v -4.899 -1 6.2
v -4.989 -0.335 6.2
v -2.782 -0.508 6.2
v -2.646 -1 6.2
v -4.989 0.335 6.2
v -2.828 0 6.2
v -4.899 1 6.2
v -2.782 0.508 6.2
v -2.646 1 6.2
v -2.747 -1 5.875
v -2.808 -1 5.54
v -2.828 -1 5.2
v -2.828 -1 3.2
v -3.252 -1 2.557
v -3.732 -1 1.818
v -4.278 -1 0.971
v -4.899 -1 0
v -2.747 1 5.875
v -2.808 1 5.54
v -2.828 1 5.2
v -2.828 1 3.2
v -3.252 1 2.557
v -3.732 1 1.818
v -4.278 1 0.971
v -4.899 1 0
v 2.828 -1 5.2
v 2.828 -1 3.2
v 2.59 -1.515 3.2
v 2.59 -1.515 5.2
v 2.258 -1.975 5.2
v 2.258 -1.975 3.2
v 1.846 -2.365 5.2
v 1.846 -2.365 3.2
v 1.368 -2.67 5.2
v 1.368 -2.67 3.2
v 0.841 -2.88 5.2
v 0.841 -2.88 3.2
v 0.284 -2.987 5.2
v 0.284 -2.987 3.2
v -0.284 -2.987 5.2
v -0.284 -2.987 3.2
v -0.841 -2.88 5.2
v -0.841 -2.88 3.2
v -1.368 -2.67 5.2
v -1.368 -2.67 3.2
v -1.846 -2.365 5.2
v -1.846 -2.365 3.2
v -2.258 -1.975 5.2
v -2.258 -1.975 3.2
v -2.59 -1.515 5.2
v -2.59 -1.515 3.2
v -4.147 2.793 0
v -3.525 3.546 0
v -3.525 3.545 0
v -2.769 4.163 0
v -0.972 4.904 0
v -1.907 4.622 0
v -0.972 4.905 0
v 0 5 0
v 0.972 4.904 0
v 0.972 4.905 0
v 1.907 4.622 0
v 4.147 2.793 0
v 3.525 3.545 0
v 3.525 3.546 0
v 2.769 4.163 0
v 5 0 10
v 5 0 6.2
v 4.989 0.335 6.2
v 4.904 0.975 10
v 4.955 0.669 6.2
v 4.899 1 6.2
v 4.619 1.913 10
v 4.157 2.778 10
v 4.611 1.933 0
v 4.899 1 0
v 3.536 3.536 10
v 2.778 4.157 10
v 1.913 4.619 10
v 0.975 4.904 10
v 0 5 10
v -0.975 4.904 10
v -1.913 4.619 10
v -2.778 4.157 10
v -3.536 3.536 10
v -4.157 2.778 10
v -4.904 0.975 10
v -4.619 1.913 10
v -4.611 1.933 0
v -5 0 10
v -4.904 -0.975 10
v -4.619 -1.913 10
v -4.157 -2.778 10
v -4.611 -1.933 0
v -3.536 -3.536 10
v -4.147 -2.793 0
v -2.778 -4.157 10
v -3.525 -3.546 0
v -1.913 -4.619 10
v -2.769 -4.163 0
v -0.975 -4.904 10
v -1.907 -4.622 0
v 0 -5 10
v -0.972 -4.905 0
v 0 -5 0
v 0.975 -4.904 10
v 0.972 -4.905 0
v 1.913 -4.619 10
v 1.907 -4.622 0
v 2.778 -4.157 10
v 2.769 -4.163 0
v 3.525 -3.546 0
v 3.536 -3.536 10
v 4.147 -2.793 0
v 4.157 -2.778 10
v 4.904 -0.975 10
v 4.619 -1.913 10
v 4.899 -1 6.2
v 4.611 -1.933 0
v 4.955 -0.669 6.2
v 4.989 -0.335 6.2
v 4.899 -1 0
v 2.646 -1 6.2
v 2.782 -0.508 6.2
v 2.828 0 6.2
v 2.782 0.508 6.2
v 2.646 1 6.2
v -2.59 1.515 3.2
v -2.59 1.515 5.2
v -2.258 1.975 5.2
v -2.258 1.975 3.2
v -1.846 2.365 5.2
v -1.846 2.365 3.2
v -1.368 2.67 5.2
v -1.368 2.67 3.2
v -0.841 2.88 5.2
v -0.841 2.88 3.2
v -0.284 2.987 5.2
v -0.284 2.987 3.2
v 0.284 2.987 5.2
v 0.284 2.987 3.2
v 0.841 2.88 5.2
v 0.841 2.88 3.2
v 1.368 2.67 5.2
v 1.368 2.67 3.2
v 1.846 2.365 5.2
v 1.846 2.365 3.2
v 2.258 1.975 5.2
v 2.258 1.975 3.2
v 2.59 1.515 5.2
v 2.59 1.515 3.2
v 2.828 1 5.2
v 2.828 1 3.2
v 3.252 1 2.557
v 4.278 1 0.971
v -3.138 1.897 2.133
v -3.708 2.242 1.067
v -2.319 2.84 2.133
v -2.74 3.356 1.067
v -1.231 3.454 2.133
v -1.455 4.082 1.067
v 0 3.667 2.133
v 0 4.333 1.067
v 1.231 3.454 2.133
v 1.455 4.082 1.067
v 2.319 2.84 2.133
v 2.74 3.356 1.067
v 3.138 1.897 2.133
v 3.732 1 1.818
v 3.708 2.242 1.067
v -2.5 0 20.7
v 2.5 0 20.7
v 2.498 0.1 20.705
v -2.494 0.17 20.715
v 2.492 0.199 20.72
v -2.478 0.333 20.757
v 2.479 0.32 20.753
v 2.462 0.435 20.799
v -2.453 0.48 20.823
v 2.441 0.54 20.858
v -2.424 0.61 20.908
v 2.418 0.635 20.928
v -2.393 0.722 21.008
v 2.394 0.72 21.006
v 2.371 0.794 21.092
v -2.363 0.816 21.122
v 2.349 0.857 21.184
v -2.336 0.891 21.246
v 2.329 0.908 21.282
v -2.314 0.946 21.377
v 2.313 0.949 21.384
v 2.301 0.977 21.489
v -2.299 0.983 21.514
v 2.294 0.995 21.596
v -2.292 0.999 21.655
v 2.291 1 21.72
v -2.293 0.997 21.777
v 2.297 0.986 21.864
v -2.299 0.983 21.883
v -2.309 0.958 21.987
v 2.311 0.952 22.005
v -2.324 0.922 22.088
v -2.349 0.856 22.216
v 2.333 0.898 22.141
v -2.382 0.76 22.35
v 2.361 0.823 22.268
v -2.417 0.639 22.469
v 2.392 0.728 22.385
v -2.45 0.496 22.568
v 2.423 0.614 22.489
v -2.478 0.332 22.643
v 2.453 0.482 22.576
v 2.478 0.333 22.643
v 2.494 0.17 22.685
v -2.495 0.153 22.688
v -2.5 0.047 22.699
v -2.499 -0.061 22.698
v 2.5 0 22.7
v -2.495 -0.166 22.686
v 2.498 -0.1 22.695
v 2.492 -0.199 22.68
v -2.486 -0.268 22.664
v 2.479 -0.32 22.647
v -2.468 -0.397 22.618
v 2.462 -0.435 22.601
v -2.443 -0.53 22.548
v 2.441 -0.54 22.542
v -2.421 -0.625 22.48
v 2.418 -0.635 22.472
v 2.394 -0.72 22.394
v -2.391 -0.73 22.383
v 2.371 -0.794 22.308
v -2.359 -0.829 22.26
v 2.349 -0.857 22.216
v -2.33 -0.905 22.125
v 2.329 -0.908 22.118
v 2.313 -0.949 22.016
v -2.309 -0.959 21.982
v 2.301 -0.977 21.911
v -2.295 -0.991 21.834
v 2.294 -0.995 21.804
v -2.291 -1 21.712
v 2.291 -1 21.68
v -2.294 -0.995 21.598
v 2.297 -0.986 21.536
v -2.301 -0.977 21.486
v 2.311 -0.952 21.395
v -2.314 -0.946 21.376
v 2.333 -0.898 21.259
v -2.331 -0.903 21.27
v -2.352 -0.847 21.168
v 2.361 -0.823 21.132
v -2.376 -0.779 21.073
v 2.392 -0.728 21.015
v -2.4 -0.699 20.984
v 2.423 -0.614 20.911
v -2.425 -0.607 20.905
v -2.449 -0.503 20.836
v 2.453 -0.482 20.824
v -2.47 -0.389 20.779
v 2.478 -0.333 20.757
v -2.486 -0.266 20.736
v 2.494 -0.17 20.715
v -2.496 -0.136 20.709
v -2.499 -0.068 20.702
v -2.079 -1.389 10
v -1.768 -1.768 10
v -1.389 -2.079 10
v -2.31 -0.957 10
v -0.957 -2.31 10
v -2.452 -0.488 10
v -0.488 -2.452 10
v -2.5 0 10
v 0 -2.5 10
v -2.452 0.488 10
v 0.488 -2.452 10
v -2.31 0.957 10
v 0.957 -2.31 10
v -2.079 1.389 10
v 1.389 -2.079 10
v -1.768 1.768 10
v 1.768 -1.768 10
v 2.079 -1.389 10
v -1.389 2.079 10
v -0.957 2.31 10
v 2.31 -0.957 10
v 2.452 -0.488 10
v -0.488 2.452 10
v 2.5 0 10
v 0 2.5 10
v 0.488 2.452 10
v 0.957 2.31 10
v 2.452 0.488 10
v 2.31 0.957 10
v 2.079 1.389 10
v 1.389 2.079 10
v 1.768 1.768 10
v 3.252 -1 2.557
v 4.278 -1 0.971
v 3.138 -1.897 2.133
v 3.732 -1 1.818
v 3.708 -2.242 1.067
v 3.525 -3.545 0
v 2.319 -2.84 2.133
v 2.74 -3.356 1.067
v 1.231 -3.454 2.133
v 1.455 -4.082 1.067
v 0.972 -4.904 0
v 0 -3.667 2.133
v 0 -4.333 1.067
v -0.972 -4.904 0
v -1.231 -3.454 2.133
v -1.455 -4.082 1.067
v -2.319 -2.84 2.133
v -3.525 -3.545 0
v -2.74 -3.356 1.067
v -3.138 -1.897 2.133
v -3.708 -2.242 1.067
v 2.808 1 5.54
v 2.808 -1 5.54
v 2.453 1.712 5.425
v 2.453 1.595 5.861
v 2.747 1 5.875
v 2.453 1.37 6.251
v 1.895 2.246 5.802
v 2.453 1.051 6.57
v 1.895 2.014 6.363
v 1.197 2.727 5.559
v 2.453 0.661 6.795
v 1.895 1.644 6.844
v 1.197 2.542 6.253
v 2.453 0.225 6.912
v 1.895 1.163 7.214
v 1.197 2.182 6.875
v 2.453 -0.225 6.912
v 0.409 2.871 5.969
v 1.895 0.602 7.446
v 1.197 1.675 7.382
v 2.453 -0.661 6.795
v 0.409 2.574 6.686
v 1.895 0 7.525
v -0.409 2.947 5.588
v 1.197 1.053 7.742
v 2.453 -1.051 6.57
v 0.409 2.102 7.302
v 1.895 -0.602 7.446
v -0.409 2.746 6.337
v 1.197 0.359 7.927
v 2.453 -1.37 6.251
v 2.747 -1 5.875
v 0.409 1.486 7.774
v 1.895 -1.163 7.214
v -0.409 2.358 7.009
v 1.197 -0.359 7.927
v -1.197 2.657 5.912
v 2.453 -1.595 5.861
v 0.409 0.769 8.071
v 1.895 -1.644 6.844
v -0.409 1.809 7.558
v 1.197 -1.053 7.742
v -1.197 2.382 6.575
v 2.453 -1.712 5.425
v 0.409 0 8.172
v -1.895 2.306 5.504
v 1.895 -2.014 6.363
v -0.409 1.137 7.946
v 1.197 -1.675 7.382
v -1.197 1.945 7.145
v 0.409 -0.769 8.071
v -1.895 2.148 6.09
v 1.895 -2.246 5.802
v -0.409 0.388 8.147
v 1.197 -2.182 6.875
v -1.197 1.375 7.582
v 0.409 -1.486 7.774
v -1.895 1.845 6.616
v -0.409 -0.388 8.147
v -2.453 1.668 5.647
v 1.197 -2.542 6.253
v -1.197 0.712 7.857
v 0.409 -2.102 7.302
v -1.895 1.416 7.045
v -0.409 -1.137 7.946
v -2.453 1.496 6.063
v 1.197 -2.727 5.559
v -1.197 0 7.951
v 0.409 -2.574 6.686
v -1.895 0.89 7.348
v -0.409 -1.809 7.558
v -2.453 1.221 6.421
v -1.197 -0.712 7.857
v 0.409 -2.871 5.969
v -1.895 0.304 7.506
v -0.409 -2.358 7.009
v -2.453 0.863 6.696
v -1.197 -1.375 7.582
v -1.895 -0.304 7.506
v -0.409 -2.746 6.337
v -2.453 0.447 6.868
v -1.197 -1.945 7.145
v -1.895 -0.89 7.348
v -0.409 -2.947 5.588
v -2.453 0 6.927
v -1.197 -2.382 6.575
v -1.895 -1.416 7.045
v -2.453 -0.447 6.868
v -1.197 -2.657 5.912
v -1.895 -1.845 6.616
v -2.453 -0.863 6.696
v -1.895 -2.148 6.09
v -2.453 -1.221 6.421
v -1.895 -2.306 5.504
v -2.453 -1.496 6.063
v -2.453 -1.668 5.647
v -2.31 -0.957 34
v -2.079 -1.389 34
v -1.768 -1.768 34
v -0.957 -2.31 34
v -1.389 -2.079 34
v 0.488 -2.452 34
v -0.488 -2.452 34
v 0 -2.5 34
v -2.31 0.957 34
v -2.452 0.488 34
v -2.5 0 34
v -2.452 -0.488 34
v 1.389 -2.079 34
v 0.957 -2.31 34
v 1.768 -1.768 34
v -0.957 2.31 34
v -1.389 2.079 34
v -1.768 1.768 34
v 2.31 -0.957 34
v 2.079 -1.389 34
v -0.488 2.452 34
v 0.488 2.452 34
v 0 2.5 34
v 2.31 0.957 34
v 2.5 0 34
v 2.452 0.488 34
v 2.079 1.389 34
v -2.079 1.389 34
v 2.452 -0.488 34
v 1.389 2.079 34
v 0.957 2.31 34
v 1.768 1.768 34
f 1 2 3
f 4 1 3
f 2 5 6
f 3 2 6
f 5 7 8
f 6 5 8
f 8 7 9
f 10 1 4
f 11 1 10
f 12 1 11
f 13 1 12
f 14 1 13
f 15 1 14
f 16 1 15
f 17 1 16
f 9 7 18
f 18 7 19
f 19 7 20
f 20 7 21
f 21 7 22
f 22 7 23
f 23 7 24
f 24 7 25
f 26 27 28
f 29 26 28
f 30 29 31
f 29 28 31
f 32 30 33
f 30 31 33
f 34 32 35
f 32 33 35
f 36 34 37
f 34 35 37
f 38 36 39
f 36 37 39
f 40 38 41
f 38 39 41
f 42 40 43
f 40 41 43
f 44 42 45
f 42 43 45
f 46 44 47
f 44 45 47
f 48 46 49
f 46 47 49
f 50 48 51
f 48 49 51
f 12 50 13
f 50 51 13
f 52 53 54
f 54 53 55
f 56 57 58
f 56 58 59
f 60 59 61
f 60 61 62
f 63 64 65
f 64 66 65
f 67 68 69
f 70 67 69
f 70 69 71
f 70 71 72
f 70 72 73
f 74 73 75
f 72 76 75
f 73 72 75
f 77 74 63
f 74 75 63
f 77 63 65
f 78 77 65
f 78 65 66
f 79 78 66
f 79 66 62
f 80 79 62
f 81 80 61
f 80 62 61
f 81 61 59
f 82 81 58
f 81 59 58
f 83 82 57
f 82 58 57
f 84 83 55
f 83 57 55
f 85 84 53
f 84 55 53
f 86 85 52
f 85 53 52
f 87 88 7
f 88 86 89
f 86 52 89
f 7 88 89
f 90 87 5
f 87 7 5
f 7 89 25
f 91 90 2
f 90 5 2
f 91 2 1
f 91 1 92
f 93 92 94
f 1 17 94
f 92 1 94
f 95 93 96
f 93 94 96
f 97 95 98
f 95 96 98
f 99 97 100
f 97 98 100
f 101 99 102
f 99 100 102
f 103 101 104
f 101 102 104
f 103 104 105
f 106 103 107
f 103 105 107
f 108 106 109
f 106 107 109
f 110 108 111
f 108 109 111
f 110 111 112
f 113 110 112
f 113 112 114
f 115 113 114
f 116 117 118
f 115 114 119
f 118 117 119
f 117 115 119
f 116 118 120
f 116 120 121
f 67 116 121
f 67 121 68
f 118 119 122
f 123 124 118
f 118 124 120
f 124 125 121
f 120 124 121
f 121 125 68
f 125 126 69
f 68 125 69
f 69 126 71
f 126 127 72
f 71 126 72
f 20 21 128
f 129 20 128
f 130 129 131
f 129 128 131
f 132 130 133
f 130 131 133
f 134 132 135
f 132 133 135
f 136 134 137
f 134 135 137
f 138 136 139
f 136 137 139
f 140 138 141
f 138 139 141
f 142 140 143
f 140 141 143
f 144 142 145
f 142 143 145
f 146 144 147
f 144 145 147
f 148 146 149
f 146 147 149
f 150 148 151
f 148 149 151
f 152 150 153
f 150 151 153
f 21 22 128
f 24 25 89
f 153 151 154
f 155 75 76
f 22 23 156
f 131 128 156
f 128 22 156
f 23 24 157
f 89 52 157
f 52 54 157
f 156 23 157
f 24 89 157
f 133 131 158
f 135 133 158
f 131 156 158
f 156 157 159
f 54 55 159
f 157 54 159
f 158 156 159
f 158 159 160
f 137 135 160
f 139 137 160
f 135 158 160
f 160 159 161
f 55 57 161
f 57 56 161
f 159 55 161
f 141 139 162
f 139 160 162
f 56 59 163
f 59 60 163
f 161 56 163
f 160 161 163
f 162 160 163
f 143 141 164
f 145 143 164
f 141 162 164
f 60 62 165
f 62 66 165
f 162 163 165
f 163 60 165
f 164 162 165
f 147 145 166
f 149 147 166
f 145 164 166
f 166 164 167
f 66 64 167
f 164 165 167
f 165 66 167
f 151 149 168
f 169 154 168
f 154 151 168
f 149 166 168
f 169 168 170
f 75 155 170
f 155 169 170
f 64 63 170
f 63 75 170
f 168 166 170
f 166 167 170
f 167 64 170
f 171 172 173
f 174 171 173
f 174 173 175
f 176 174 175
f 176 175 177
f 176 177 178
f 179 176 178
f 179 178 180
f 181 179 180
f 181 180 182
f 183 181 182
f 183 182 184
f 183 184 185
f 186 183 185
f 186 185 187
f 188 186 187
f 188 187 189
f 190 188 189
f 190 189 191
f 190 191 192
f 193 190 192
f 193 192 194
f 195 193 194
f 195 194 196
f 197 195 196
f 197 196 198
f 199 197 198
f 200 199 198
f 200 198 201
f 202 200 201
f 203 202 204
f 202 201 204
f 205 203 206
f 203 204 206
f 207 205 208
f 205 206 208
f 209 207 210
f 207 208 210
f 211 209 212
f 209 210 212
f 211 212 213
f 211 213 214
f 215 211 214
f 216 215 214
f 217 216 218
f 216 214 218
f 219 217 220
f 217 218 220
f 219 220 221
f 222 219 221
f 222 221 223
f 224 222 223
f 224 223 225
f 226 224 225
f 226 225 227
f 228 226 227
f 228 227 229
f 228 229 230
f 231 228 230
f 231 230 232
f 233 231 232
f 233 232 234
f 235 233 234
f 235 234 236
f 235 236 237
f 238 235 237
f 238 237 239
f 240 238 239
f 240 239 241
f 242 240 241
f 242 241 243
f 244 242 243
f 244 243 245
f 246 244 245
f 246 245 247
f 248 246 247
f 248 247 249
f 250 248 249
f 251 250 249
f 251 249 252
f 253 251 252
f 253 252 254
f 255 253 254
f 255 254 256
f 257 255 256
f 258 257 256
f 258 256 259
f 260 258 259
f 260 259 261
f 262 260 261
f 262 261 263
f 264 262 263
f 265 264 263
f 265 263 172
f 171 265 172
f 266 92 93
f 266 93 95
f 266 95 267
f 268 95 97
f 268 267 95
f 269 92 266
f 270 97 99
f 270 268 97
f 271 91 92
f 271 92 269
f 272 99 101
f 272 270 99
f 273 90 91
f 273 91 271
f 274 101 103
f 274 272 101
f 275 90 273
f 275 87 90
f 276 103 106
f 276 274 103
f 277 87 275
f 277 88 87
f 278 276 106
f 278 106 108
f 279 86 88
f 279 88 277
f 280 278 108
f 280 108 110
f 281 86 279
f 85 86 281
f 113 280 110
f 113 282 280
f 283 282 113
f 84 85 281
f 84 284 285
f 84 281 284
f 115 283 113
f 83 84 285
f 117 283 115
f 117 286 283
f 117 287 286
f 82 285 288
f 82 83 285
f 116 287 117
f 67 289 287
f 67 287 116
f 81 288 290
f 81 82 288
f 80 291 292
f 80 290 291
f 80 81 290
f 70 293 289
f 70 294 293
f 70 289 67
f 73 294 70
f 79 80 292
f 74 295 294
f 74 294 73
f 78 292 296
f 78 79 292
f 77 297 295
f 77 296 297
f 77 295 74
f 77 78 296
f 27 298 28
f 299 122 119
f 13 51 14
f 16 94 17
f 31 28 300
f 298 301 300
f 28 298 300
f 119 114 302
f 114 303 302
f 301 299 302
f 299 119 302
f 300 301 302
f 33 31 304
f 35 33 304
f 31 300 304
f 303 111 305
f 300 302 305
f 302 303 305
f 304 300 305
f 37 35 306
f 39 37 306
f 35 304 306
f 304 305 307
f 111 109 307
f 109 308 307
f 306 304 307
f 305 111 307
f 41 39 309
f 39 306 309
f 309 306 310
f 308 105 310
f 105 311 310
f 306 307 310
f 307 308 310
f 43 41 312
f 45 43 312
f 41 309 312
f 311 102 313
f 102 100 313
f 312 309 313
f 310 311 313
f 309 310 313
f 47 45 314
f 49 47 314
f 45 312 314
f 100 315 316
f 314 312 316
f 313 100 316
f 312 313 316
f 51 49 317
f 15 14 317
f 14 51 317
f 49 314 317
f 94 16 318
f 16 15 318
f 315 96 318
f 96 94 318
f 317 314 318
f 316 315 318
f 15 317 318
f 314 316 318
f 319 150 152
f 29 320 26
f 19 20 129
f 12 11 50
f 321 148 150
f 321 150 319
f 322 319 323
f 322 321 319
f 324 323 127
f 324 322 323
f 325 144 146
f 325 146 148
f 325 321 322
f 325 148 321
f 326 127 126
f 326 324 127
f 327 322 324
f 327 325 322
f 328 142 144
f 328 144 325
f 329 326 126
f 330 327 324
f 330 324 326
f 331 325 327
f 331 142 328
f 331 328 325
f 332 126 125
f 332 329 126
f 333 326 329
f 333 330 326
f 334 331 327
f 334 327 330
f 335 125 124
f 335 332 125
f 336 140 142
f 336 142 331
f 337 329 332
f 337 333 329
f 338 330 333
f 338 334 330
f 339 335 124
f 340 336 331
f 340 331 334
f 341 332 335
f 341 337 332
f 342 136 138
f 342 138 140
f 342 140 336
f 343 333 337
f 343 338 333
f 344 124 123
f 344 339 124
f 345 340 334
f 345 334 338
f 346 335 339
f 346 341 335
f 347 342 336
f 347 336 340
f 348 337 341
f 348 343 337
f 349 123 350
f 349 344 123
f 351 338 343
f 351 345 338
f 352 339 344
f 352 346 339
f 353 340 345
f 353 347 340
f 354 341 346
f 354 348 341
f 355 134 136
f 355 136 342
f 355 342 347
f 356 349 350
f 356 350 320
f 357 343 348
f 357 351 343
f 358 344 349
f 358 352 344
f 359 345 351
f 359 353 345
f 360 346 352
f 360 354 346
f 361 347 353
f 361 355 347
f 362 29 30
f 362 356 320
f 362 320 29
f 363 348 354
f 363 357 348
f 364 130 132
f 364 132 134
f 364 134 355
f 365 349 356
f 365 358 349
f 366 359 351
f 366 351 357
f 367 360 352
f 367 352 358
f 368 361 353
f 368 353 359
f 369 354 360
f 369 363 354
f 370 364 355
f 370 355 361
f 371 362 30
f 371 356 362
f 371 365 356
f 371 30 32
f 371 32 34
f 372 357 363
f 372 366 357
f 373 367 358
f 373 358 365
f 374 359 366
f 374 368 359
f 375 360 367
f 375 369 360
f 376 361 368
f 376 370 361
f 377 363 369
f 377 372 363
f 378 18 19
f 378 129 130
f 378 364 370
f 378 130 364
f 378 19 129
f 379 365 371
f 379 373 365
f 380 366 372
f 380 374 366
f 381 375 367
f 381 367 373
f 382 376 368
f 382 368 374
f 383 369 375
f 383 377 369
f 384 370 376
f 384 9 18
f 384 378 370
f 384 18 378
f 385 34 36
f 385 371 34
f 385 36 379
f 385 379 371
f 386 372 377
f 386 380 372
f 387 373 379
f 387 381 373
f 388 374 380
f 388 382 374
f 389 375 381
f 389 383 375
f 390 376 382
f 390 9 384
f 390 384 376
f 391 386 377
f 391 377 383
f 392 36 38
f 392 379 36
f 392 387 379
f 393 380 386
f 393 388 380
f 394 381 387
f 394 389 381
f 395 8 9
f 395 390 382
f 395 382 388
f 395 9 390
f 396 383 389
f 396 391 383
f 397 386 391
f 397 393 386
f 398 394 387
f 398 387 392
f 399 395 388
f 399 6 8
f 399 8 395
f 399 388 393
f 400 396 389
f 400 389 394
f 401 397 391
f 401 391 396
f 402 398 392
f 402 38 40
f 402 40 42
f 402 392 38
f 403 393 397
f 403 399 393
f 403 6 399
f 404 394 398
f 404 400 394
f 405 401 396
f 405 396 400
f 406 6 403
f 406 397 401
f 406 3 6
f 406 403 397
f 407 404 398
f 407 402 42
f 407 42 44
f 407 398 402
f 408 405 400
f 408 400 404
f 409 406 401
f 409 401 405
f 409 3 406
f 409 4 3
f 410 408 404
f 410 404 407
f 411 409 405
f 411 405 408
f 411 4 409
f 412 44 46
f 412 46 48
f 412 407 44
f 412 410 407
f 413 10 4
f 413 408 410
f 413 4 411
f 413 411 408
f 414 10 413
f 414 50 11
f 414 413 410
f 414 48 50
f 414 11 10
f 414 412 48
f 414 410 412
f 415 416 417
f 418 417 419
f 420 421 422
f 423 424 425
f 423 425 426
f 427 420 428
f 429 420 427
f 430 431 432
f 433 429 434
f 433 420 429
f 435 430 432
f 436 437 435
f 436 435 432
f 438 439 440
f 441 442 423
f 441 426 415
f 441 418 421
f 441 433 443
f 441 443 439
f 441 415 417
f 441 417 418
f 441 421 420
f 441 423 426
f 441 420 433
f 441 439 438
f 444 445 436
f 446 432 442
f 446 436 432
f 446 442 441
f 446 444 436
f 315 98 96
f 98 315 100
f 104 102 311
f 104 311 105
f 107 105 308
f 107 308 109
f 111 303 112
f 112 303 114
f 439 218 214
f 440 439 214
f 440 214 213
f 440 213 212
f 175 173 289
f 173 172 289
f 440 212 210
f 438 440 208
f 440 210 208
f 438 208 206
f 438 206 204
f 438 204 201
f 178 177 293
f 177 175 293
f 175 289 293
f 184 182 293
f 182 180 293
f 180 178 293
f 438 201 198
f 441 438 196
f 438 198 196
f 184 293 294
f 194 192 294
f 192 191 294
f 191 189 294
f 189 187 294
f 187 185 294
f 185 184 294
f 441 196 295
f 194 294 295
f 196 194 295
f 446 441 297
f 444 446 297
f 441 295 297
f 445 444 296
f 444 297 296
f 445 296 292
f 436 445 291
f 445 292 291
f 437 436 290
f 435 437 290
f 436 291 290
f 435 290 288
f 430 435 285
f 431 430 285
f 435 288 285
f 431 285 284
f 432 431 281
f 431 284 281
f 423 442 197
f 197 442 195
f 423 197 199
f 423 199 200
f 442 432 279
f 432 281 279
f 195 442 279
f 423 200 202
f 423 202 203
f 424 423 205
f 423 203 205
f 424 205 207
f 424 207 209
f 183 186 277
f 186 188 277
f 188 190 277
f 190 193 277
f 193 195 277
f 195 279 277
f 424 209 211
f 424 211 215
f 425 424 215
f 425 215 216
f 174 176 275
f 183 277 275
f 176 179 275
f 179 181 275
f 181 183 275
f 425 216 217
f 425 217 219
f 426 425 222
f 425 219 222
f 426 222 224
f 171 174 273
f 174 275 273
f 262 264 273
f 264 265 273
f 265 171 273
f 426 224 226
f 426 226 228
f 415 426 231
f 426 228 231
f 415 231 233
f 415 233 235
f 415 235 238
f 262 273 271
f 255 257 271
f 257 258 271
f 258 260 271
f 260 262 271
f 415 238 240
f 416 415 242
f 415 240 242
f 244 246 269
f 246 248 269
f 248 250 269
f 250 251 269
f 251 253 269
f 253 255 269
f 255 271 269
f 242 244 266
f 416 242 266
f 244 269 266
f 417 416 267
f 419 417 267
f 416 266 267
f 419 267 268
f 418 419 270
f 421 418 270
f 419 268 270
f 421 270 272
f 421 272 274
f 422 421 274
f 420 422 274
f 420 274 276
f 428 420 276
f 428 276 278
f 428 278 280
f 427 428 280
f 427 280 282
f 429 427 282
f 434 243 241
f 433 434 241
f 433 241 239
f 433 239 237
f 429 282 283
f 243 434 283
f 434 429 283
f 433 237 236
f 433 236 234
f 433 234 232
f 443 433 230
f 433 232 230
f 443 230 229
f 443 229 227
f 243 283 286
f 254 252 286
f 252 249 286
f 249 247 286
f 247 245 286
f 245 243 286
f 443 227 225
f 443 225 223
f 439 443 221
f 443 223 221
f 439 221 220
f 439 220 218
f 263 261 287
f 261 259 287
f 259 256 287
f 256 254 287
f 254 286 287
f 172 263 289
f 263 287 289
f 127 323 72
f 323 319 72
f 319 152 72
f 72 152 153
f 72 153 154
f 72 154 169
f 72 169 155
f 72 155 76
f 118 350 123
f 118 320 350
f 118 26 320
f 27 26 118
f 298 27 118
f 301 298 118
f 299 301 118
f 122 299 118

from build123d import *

# Parameters (mm, degrees)
SKETCH1_R           = 5
BOSS_EXTRUDE1_DEPTH = 10
SKETCH2_R           = 2.5
BOSS_EXTRUDE2_DEPTH = 24
SKETCH3_R           = 3
CUT_EXTRUDE1_DEPTH  = 5.2
CHAMFER1_SIZE       = 3.2
CHAMFER1_SIZE2      = 1.999581926
SKETCH7_W           = 12.152582876
SKETCH7_H           = 2
CUT_EXTRUDE2_DEPTH  = 6.2
CUT_EXTRUDE3_REACH  = 37.175
SKETCH8_R           = 1


with BuildPart() as part:
    # Sketch1 → Boss-Extrude1 (new body)
    with BuildSketch(Plane.XY):
        Circle(SKETCH1_R)
    extrude(amount=BOSS_EXTRUDE1_DEPTH)

    # Sketch2 → Boss-Extrude2 (add)
    with BuildSketch(Plane.XY.offset(10)):
        Circle(SKETCH2_R)
    extrude(amount=BOSS_EXTRUDE2_DEPTH)

    # Sketch3 → Cut-Extrude1 (cut)
    with BuildSketch(Plane(origin=(0, 0, 0), x_dir=(-1, 0, 0), z_dir=(0, 0, -1))):
        Circle(SKETCH3_R)
    extrude(amount=-CUT_EXTRUDE1_DEPTH, mode=Mode.SUBTRACT)

    # Chamfer1
    chamfer1_edges = [part.edges().sort_by_distance(p)[0] for p in [
        (3, 0, 0),
    ]]
    chamfer1_side = [part.faces().sort_by_distance(p)[0] for p in [
        (3, 0, 2.6),
    ]]
    chamfer(chamfer1_edges, length=CHAMFER1_SIZE, length2=CHAMFER1_SIZE2, reference=chamfer1_side[0])

    # Sketch6 → Cut-Revolve2 (revolve, cut)
    with BuildSketch(Plane(origin=(0, 0, 5.2), x_dir=(-1, 0, 0), z_dir=(0, 0, -1))):
        with BuildLine():
            Line((3, 0), (-3, 0))
            ThreePointArc((-3, 0), (0, -3), (3, 0))
        make_face()
    revolve(axis=Axis((-3, 0, 5.2), (1, 0, 0)), mode=Mode.SUBTRACT)

    # Sketch7 → Cut-Extrude2 (cut)
    with BuildSketch(Plane.XY):
        Rectangle(SKETCH7_W, SKETCH7_H)
    extrude(amount=CUT_EXTRUDE2_DEPTH, mode=Mode.SUBTRACT)

    # Sketch8 → Cut-Extrude3 (cut, up to next)
    with BuildSketch(Plane(origin=(2.5, 0, 0), x_dir=(0, 0, -1), z_dir=(1, 0, 0)), mode=Mode.PRIVATE) as cut_extrude3_sk1:
        with Locations((-21.7, 0)):
            Circle(SKETCH8_R)
    cut_extrude3_tool1 = extrude(cut_extrude3_sk1.sketch, amount=-CUT_EXTRUDE3_REACH, mode=Mode.PRIVATE) & part.part
    add(cut_extrude3_tool1.solids().sort_by_distance((2.5, 0, 21.7))[0], mode=Mode.SUBTRACT)


solid = part.part
